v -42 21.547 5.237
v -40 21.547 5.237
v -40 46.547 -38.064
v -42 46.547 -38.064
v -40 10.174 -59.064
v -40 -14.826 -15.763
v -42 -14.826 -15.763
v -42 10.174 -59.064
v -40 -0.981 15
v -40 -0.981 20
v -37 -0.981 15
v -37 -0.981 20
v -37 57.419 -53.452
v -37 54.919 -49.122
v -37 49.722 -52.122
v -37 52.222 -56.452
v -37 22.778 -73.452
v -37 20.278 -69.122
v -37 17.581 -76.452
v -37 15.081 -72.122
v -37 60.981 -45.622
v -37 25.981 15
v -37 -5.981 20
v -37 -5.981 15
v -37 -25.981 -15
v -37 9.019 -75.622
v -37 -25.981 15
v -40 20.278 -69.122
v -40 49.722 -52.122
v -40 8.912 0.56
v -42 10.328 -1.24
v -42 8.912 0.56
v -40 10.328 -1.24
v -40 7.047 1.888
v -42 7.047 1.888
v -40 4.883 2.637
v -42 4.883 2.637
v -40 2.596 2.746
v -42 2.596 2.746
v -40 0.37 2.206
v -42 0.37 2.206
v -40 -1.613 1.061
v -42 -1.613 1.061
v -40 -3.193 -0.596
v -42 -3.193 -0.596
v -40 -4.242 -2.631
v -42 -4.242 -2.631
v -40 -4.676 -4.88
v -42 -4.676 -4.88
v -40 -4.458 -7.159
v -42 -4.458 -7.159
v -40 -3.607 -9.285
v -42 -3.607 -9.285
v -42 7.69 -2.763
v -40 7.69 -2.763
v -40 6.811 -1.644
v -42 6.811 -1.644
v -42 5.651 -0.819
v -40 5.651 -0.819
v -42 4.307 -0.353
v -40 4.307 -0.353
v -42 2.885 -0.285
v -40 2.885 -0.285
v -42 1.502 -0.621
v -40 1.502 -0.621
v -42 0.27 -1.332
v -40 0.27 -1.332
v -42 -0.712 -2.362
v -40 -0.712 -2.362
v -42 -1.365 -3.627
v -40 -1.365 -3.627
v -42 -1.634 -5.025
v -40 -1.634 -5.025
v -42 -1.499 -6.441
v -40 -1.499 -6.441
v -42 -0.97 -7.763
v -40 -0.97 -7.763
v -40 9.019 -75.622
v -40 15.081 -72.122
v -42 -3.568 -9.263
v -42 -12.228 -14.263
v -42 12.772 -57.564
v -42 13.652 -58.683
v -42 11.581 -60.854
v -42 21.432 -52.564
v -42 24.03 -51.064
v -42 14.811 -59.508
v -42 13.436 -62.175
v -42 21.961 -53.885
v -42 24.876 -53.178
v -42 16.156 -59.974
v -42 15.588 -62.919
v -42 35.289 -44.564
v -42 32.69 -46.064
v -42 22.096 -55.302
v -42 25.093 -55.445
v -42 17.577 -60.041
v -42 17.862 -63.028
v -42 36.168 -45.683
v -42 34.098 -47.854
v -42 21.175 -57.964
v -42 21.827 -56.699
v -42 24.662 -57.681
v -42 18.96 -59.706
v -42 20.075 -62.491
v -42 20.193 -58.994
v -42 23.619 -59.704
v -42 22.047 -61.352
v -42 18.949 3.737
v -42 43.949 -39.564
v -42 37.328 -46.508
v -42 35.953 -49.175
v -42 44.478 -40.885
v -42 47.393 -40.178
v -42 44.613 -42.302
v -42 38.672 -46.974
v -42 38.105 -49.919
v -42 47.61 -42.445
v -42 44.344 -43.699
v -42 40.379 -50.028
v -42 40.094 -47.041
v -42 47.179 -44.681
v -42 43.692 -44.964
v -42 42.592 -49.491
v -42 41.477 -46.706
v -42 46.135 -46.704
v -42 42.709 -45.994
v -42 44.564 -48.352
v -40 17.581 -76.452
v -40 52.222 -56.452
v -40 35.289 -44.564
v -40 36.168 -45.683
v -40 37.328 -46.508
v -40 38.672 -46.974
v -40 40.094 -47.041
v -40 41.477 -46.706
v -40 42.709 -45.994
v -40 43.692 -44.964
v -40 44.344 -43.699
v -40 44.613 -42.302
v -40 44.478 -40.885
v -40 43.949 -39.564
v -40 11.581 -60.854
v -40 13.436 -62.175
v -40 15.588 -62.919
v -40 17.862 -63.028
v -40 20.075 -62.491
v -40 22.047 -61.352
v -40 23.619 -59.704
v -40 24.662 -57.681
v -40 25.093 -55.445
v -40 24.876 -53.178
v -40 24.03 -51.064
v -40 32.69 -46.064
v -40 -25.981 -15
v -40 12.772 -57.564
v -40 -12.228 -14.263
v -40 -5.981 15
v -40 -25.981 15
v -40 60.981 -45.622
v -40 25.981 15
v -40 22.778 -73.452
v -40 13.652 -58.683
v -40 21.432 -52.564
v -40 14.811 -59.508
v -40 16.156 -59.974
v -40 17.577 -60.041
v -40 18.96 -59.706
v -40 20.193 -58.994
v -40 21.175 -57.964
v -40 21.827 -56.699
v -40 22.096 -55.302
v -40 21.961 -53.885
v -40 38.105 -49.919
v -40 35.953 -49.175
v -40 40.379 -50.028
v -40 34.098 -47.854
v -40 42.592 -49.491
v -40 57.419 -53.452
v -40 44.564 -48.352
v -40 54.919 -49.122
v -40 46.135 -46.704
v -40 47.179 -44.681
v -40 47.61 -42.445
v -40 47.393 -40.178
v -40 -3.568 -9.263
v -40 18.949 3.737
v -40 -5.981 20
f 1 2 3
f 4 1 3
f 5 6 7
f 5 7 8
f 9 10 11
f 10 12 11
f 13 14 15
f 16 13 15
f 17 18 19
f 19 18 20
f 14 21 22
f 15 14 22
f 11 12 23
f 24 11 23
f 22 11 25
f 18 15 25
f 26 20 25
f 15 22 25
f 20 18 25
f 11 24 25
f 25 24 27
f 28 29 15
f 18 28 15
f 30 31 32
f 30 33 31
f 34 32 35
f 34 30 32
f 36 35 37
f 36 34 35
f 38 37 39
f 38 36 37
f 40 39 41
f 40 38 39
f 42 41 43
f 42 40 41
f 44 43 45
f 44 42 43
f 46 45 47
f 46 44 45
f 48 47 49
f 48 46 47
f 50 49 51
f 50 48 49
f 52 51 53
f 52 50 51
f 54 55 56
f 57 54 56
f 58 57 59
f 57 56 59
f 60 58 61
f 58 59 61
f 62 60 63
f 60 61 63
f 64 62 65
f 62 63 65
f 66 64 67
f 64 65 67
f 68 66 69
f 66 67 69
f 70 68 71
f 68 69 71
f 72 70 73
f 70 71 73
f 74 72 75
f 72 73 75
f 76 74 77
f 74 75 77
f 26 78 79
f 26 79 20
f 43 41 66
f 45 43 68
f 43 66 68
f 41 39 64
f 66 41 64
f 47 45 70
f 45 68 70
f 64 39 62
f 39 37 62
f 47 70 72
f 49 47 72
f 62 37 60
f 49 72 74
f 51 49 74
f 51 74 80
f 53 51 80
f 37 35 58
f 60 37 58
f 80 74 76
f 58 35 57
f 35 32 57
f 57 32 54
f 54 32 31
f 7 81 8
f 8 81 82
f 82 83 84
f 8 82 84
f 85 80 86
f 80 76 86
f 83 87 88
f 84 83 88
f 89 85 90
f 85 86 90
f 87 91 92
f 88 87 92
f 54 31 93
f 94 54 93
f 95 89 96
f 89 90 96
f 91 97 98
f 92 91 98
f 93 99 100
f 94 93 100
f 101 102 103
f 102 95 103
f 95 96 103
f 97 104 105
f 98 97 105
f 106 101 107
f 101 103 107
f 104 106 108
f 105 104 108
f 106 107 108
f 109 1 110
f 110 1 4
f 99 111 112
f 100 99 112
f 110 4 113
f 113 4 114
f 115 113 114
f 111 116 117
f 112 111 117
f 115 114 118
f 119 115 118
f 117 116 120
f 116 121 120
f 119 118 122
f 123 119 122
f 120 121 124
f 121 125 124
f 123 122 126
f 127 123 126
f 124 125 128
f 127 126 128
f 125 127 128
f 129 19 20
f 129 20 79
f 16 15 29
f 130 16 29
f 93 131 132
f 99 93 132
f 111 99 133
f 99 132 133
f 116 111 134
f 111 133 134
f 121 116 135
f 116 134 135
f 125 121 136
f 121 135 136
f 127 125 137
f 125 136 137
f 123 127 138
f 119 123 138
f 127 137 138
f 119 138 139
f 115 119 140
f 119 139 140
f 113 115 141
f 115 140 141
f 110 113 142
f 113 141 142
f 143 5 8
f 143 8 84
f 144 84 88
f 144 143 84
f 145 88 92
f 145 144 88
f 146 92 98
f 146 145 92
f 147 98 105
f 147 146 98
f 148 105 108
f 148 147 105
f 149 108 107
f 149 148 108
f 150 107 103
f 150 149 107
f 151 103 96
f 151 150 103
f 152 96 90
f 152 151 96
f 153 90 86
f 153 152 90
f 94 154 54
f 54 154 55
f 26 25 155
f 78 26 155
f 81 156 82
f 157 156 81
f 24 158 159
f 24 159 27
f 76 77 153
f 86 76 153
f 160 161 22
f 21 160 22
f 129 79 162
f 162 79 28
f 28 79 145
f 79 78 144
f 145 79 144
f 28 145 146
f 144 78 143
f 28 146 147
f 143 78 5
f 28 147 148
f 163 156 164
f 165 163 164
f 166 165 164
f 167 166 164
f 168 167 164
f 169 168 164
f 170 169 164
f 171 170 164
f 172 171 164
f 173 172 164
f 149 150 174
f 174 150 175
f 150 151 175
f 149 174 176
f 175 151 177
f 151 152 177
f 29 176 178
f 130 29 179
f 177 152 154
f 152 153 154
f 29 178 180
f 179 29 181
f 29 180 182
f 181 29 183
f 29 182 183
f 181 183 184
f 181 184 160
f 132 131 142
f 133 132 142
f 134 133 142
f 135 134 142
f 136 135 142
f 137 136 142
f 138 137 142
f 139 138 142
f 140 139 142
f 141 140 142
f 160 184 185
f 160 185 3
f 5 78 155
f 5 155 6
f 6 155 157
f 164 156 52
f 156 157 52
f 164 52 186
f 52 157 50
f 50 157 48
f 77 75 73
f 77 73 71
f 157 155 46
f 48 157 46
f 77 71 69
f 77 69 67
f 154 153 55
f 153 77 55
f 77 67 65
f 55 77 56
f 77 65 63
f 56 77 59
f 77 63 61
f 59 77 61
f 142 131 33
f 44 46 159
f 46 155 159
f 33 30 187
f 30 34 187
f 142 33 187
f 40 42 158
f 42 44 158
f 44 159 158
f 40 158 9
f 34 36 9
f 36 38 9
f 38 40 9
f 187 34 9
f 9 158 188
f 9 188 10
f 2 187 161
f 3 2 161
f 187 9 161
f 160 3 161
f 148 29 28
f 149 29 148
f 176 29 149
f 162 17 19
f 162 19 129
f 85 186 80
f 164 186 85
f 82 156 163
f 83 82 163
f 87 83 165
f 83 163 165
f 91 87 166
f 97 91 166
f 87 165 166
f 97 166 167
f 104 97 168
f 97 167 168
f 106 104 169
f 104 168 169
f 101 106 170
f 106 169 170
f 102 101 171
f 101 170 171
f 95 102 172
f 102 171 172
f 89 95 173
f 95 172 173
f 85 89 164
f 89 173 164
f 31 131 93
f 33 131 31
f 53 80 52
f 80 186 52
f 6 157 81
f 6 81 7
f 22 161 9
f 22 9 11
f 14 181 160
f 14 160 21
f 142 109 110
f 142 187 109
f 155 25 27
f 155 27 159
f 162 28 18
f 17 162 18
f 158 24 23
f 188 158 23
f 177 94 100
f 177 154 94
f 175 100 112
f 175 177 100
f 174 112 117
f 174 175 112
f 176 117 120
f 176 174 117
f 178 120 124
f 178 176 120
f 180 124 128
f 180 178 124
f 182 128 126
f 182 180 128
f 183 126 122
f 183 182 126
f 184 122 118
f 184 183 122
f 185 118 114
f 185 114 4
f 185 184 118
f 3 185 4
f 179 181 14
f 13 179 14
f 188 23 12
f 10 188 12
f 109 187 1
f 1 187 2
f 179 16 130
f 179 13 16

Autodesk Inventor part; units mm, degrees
ref_plane "Plan de construction1" through (0, 0, 0) normal (0, 0.5, -0.8660254) x (1, 0, 0)
sketch "Esquisse1" plane through (0, 0, 0) normal (0, 0.5, -0.8660254) x (1, 0, 0)
  line L0 (-40, 0) -> (-40, -30)
  line L1 (-40, -30) -> (-37, -30)
  line L2 (-40, -30) -> (-37, -30)
  line L3 (-37, -30) -> (-37, 30)
  line L4 (-37, 30) -> (-40, 30)
  line L5 (-40, 30) -> (-40, -30)
  point P0 (0, 0)
  point P1 (-37, 0)
  point P2 (-37, -30)
  dimension "d2" = 30
  dimension "d3" = 3
  dimension "d4" = 60
  dimension "d49" = 37
  dimension "d50" = 40
extrude "Extrusion1" add sketch "Esquisse1" along normal blind 70
ref_plane "Plan de construction2" through (0, 0, 15) normal (0, 0, 1) x (1, 0, 0)
sketch "Esquisse2" plane through (0, 0, 15) normal (0, 0, 1) x (1, 0, 0)
  line L0 (-40, -25.9808) -> (-40, 25.9808) projected
  line L1 (-37, 25.9808) -> (-37, -25.9808) projected
  line L2 (-40, 25.9808) -> (-37, 25.9808) projected
  line L3 (-37, -25.9808) -> (-40, -25.9808) projected
  line L4 (-37, 60.9808) -> (-37, 9.0192) projected
  line L5 (-40, 25.9808) -> (-37, 25.9808)
  line L6 (-37, 25.9808) -> (-37, 35.9808)
  line L7 (-37, 35.9808) -> (-40, 35.9808)
  line L8 (-40, 35.9808) -> (-40, 25.9808)
  point P0 (0, 0)
  point P1 (37, 25.9808)
  dimension "d46" = 10
extrude "Extrusion2" add sketch "Esquisse2" against normal blind 30 contours L0 L2 L1 L3
ref_plane "Plan de construction3" through (-37, -25.9808, 15) normal (1, 0, 0) x (0, 0, -1)
sketch "Esquisse3" plane through (-37, -25.9808, 15) normal (1, 0, 0) x (0, 0, -1)
  line L0 (0, 0) -> (0, 20)
  line L1 (0, 51.9615) -> (0, 0) projected
  line L2 (0, 20) -> (-5, 20)
  line L3 (-5, 20) -> (-5, 25)
  line L4 (-5, 25) -> (0, 25)
  point P0 (15, 25.9808)
  dimension "d16" = 20
  dimension "d17" = 5
extrude "Extrusion3" add sketch "Esquisse3" against normal up to surface (3 mm away)
sketch "Esquisse13" plane through (0, 35, -60.6218) normal (0, 0.5, -0.8660254) x (-1, 0, 0)
  line L0 (37, 30) -> (37, -30) projected
  line L1 (37, 0) -> (37, 20)
  line L2 (37, 20) -> (40, 20)
  line L3 (40, -30) -> (40, 30) projected
  line L4 (40, 20) -> (40, 23)
  line L5 (40, 23) -> (37, 23)
  line L6 (37, 23) -> (37, 17)
  line L7 (37, 17) -> (40, 17)
  line L8 (40, 17) -> (40, 20)
  line L9 (37, 0) -> (37, -20)
  line L10 (37, -20) -> (40, -20)
  line L11 (40, -20) -> (40, -17)
  line L12 (40, -17) -> (37, -17)
  line L13 (37, -17) -> (37, -23)
  line L14 (37, -23) -> (40, -23)
  line L15 (40, -23) -> (40, -20)
  point P0 (0, 0)
  point P1 (37, 23)
  point P2 (37, 17)
  point P3 (40, 17)
  dimension "d53" = 20
  dimension "d54" = 3
  dimension "d55" = 6
  dimension "d56" = 20
  dimension "d57" = 3
  dimension "d58" = 6
extrude "Extrusion12" add sketch "Esquisse13" along normal blind 5 contours L5 L3 L2 L0 | L2 L3 L7 L0 | L12 L3 L10 L0 | L10 L3 L14 L0
sketch "Esquisse14" plane through (-37, -25.9808, 15) normal (1, 0, 0) x (0, 0, -1)
  line L0 (11.2627, 44.9296) -> (54.564, 69.9296)
  line L1 (11.2627, 44.9296) -> (61.2627, 44.9296) construction
  arc A0 (59.564, 61.2694) -> (54.564, 69.9296) centre (57.064, 65.5995) ccw
  line L2 (59.564, 61.2694) -> (16.2401, 36.3085)
  line L3 (26.3922, 19.4858) -> (76.3922, 19.4858) construction
  line L4 (11.2627, 44.9296) -> (9.7627, 47.5277)
  line L5 (9.7627, 47.5277) -> (53.064, 72.5277)
  line L6 (59.564, 61.2694) -> (61.064, 58.6713)
  line L7 (61.064, 58.6713) -> (17.7627, 33.6713)
  line L8 (17.7627, 33.6713) -> (22.7627, 25.011)
  line L9 (17.7627, 33.6713) -> (27.7627, 33.6713) construction
  line L10 (22.7627, 25.011) -> (66.064, 50.011)
  line L11 (17.7627, 33.6713) -> (22.7627, 25.011)
  arc A1 (17.7627, 33.6713) -> (22.7627, 25.011) centre (20.2627, 29.3412) ccw
  line L12 (22.7627, 25.011) -> (24.2627, 22.413)
  line L13 (24.2627, 22.413) -> (67.564, 47.413)
  arc A2 (16.2401, 36.3085) -> (24.2853, 22.3738) centre (20.2627, 29.3412) ccw
  arc A3 (61.064, 58.6713) -> (53.064, 72.5277) centre (57.064, 65.5995) ccw
  line L14 (67.564, 47.413) -> (72.564, 38.7527)
  line L15 (67.564, 47.413) -> (77.564, 47.413) construction
  line L16 (72.564, 38.7527) -> (29.2627, 13.7527)
  line L17 (29.2627, 13.7527) -> (30.7627, 11.1546)
  line L18 (30.7627, 11.1546) -> (74.064, 36.1546)
  arc A4 (72.564, 38.7527) -> (67.564, 47.413) centre (70.064, 43.0828) ccw
  arc A5 (74.064, 36.1546) -> (66.064, 50.011) centre (70.064, 43.0828) ccw
  line L19 (16.2401, 36.3085) -> (17.7627, 33.6713)
  line L20 (22.7627, 25.011) -> (24.2853, 22.3738)
  line L21 (59.564, 61.2694) -> (61.064, 58.6713)
  dimension "d61" = 50
  dimension "d62" = 30
  dimension "d63" = 10
  dimension "d64" = 5
  dimension "d71" = 3
  dimension "d72" = 3
  dimension "d75" = 10
  dimension "d76" = 60
  dimension "d78" = 90
  dimension "d79" = 3
  dimension "d80" = 10
  dimension "d81" = 60
  dimension "d82" = 50
  dimension "d83" = 90
  dimension "d84" = 3
  dimension "d85" = 5
extrude "Extrusion13" add sketch "Esquisse14" against normal blind 5 contours L4 L5 A3 L6 A0 L0 | L6 L7 L19 L2 | L19 A1 L12 L20 A2 | L12 L10 A5 L18 L17 L16 A4 L13
properties part number "autour hélice autre côté"
